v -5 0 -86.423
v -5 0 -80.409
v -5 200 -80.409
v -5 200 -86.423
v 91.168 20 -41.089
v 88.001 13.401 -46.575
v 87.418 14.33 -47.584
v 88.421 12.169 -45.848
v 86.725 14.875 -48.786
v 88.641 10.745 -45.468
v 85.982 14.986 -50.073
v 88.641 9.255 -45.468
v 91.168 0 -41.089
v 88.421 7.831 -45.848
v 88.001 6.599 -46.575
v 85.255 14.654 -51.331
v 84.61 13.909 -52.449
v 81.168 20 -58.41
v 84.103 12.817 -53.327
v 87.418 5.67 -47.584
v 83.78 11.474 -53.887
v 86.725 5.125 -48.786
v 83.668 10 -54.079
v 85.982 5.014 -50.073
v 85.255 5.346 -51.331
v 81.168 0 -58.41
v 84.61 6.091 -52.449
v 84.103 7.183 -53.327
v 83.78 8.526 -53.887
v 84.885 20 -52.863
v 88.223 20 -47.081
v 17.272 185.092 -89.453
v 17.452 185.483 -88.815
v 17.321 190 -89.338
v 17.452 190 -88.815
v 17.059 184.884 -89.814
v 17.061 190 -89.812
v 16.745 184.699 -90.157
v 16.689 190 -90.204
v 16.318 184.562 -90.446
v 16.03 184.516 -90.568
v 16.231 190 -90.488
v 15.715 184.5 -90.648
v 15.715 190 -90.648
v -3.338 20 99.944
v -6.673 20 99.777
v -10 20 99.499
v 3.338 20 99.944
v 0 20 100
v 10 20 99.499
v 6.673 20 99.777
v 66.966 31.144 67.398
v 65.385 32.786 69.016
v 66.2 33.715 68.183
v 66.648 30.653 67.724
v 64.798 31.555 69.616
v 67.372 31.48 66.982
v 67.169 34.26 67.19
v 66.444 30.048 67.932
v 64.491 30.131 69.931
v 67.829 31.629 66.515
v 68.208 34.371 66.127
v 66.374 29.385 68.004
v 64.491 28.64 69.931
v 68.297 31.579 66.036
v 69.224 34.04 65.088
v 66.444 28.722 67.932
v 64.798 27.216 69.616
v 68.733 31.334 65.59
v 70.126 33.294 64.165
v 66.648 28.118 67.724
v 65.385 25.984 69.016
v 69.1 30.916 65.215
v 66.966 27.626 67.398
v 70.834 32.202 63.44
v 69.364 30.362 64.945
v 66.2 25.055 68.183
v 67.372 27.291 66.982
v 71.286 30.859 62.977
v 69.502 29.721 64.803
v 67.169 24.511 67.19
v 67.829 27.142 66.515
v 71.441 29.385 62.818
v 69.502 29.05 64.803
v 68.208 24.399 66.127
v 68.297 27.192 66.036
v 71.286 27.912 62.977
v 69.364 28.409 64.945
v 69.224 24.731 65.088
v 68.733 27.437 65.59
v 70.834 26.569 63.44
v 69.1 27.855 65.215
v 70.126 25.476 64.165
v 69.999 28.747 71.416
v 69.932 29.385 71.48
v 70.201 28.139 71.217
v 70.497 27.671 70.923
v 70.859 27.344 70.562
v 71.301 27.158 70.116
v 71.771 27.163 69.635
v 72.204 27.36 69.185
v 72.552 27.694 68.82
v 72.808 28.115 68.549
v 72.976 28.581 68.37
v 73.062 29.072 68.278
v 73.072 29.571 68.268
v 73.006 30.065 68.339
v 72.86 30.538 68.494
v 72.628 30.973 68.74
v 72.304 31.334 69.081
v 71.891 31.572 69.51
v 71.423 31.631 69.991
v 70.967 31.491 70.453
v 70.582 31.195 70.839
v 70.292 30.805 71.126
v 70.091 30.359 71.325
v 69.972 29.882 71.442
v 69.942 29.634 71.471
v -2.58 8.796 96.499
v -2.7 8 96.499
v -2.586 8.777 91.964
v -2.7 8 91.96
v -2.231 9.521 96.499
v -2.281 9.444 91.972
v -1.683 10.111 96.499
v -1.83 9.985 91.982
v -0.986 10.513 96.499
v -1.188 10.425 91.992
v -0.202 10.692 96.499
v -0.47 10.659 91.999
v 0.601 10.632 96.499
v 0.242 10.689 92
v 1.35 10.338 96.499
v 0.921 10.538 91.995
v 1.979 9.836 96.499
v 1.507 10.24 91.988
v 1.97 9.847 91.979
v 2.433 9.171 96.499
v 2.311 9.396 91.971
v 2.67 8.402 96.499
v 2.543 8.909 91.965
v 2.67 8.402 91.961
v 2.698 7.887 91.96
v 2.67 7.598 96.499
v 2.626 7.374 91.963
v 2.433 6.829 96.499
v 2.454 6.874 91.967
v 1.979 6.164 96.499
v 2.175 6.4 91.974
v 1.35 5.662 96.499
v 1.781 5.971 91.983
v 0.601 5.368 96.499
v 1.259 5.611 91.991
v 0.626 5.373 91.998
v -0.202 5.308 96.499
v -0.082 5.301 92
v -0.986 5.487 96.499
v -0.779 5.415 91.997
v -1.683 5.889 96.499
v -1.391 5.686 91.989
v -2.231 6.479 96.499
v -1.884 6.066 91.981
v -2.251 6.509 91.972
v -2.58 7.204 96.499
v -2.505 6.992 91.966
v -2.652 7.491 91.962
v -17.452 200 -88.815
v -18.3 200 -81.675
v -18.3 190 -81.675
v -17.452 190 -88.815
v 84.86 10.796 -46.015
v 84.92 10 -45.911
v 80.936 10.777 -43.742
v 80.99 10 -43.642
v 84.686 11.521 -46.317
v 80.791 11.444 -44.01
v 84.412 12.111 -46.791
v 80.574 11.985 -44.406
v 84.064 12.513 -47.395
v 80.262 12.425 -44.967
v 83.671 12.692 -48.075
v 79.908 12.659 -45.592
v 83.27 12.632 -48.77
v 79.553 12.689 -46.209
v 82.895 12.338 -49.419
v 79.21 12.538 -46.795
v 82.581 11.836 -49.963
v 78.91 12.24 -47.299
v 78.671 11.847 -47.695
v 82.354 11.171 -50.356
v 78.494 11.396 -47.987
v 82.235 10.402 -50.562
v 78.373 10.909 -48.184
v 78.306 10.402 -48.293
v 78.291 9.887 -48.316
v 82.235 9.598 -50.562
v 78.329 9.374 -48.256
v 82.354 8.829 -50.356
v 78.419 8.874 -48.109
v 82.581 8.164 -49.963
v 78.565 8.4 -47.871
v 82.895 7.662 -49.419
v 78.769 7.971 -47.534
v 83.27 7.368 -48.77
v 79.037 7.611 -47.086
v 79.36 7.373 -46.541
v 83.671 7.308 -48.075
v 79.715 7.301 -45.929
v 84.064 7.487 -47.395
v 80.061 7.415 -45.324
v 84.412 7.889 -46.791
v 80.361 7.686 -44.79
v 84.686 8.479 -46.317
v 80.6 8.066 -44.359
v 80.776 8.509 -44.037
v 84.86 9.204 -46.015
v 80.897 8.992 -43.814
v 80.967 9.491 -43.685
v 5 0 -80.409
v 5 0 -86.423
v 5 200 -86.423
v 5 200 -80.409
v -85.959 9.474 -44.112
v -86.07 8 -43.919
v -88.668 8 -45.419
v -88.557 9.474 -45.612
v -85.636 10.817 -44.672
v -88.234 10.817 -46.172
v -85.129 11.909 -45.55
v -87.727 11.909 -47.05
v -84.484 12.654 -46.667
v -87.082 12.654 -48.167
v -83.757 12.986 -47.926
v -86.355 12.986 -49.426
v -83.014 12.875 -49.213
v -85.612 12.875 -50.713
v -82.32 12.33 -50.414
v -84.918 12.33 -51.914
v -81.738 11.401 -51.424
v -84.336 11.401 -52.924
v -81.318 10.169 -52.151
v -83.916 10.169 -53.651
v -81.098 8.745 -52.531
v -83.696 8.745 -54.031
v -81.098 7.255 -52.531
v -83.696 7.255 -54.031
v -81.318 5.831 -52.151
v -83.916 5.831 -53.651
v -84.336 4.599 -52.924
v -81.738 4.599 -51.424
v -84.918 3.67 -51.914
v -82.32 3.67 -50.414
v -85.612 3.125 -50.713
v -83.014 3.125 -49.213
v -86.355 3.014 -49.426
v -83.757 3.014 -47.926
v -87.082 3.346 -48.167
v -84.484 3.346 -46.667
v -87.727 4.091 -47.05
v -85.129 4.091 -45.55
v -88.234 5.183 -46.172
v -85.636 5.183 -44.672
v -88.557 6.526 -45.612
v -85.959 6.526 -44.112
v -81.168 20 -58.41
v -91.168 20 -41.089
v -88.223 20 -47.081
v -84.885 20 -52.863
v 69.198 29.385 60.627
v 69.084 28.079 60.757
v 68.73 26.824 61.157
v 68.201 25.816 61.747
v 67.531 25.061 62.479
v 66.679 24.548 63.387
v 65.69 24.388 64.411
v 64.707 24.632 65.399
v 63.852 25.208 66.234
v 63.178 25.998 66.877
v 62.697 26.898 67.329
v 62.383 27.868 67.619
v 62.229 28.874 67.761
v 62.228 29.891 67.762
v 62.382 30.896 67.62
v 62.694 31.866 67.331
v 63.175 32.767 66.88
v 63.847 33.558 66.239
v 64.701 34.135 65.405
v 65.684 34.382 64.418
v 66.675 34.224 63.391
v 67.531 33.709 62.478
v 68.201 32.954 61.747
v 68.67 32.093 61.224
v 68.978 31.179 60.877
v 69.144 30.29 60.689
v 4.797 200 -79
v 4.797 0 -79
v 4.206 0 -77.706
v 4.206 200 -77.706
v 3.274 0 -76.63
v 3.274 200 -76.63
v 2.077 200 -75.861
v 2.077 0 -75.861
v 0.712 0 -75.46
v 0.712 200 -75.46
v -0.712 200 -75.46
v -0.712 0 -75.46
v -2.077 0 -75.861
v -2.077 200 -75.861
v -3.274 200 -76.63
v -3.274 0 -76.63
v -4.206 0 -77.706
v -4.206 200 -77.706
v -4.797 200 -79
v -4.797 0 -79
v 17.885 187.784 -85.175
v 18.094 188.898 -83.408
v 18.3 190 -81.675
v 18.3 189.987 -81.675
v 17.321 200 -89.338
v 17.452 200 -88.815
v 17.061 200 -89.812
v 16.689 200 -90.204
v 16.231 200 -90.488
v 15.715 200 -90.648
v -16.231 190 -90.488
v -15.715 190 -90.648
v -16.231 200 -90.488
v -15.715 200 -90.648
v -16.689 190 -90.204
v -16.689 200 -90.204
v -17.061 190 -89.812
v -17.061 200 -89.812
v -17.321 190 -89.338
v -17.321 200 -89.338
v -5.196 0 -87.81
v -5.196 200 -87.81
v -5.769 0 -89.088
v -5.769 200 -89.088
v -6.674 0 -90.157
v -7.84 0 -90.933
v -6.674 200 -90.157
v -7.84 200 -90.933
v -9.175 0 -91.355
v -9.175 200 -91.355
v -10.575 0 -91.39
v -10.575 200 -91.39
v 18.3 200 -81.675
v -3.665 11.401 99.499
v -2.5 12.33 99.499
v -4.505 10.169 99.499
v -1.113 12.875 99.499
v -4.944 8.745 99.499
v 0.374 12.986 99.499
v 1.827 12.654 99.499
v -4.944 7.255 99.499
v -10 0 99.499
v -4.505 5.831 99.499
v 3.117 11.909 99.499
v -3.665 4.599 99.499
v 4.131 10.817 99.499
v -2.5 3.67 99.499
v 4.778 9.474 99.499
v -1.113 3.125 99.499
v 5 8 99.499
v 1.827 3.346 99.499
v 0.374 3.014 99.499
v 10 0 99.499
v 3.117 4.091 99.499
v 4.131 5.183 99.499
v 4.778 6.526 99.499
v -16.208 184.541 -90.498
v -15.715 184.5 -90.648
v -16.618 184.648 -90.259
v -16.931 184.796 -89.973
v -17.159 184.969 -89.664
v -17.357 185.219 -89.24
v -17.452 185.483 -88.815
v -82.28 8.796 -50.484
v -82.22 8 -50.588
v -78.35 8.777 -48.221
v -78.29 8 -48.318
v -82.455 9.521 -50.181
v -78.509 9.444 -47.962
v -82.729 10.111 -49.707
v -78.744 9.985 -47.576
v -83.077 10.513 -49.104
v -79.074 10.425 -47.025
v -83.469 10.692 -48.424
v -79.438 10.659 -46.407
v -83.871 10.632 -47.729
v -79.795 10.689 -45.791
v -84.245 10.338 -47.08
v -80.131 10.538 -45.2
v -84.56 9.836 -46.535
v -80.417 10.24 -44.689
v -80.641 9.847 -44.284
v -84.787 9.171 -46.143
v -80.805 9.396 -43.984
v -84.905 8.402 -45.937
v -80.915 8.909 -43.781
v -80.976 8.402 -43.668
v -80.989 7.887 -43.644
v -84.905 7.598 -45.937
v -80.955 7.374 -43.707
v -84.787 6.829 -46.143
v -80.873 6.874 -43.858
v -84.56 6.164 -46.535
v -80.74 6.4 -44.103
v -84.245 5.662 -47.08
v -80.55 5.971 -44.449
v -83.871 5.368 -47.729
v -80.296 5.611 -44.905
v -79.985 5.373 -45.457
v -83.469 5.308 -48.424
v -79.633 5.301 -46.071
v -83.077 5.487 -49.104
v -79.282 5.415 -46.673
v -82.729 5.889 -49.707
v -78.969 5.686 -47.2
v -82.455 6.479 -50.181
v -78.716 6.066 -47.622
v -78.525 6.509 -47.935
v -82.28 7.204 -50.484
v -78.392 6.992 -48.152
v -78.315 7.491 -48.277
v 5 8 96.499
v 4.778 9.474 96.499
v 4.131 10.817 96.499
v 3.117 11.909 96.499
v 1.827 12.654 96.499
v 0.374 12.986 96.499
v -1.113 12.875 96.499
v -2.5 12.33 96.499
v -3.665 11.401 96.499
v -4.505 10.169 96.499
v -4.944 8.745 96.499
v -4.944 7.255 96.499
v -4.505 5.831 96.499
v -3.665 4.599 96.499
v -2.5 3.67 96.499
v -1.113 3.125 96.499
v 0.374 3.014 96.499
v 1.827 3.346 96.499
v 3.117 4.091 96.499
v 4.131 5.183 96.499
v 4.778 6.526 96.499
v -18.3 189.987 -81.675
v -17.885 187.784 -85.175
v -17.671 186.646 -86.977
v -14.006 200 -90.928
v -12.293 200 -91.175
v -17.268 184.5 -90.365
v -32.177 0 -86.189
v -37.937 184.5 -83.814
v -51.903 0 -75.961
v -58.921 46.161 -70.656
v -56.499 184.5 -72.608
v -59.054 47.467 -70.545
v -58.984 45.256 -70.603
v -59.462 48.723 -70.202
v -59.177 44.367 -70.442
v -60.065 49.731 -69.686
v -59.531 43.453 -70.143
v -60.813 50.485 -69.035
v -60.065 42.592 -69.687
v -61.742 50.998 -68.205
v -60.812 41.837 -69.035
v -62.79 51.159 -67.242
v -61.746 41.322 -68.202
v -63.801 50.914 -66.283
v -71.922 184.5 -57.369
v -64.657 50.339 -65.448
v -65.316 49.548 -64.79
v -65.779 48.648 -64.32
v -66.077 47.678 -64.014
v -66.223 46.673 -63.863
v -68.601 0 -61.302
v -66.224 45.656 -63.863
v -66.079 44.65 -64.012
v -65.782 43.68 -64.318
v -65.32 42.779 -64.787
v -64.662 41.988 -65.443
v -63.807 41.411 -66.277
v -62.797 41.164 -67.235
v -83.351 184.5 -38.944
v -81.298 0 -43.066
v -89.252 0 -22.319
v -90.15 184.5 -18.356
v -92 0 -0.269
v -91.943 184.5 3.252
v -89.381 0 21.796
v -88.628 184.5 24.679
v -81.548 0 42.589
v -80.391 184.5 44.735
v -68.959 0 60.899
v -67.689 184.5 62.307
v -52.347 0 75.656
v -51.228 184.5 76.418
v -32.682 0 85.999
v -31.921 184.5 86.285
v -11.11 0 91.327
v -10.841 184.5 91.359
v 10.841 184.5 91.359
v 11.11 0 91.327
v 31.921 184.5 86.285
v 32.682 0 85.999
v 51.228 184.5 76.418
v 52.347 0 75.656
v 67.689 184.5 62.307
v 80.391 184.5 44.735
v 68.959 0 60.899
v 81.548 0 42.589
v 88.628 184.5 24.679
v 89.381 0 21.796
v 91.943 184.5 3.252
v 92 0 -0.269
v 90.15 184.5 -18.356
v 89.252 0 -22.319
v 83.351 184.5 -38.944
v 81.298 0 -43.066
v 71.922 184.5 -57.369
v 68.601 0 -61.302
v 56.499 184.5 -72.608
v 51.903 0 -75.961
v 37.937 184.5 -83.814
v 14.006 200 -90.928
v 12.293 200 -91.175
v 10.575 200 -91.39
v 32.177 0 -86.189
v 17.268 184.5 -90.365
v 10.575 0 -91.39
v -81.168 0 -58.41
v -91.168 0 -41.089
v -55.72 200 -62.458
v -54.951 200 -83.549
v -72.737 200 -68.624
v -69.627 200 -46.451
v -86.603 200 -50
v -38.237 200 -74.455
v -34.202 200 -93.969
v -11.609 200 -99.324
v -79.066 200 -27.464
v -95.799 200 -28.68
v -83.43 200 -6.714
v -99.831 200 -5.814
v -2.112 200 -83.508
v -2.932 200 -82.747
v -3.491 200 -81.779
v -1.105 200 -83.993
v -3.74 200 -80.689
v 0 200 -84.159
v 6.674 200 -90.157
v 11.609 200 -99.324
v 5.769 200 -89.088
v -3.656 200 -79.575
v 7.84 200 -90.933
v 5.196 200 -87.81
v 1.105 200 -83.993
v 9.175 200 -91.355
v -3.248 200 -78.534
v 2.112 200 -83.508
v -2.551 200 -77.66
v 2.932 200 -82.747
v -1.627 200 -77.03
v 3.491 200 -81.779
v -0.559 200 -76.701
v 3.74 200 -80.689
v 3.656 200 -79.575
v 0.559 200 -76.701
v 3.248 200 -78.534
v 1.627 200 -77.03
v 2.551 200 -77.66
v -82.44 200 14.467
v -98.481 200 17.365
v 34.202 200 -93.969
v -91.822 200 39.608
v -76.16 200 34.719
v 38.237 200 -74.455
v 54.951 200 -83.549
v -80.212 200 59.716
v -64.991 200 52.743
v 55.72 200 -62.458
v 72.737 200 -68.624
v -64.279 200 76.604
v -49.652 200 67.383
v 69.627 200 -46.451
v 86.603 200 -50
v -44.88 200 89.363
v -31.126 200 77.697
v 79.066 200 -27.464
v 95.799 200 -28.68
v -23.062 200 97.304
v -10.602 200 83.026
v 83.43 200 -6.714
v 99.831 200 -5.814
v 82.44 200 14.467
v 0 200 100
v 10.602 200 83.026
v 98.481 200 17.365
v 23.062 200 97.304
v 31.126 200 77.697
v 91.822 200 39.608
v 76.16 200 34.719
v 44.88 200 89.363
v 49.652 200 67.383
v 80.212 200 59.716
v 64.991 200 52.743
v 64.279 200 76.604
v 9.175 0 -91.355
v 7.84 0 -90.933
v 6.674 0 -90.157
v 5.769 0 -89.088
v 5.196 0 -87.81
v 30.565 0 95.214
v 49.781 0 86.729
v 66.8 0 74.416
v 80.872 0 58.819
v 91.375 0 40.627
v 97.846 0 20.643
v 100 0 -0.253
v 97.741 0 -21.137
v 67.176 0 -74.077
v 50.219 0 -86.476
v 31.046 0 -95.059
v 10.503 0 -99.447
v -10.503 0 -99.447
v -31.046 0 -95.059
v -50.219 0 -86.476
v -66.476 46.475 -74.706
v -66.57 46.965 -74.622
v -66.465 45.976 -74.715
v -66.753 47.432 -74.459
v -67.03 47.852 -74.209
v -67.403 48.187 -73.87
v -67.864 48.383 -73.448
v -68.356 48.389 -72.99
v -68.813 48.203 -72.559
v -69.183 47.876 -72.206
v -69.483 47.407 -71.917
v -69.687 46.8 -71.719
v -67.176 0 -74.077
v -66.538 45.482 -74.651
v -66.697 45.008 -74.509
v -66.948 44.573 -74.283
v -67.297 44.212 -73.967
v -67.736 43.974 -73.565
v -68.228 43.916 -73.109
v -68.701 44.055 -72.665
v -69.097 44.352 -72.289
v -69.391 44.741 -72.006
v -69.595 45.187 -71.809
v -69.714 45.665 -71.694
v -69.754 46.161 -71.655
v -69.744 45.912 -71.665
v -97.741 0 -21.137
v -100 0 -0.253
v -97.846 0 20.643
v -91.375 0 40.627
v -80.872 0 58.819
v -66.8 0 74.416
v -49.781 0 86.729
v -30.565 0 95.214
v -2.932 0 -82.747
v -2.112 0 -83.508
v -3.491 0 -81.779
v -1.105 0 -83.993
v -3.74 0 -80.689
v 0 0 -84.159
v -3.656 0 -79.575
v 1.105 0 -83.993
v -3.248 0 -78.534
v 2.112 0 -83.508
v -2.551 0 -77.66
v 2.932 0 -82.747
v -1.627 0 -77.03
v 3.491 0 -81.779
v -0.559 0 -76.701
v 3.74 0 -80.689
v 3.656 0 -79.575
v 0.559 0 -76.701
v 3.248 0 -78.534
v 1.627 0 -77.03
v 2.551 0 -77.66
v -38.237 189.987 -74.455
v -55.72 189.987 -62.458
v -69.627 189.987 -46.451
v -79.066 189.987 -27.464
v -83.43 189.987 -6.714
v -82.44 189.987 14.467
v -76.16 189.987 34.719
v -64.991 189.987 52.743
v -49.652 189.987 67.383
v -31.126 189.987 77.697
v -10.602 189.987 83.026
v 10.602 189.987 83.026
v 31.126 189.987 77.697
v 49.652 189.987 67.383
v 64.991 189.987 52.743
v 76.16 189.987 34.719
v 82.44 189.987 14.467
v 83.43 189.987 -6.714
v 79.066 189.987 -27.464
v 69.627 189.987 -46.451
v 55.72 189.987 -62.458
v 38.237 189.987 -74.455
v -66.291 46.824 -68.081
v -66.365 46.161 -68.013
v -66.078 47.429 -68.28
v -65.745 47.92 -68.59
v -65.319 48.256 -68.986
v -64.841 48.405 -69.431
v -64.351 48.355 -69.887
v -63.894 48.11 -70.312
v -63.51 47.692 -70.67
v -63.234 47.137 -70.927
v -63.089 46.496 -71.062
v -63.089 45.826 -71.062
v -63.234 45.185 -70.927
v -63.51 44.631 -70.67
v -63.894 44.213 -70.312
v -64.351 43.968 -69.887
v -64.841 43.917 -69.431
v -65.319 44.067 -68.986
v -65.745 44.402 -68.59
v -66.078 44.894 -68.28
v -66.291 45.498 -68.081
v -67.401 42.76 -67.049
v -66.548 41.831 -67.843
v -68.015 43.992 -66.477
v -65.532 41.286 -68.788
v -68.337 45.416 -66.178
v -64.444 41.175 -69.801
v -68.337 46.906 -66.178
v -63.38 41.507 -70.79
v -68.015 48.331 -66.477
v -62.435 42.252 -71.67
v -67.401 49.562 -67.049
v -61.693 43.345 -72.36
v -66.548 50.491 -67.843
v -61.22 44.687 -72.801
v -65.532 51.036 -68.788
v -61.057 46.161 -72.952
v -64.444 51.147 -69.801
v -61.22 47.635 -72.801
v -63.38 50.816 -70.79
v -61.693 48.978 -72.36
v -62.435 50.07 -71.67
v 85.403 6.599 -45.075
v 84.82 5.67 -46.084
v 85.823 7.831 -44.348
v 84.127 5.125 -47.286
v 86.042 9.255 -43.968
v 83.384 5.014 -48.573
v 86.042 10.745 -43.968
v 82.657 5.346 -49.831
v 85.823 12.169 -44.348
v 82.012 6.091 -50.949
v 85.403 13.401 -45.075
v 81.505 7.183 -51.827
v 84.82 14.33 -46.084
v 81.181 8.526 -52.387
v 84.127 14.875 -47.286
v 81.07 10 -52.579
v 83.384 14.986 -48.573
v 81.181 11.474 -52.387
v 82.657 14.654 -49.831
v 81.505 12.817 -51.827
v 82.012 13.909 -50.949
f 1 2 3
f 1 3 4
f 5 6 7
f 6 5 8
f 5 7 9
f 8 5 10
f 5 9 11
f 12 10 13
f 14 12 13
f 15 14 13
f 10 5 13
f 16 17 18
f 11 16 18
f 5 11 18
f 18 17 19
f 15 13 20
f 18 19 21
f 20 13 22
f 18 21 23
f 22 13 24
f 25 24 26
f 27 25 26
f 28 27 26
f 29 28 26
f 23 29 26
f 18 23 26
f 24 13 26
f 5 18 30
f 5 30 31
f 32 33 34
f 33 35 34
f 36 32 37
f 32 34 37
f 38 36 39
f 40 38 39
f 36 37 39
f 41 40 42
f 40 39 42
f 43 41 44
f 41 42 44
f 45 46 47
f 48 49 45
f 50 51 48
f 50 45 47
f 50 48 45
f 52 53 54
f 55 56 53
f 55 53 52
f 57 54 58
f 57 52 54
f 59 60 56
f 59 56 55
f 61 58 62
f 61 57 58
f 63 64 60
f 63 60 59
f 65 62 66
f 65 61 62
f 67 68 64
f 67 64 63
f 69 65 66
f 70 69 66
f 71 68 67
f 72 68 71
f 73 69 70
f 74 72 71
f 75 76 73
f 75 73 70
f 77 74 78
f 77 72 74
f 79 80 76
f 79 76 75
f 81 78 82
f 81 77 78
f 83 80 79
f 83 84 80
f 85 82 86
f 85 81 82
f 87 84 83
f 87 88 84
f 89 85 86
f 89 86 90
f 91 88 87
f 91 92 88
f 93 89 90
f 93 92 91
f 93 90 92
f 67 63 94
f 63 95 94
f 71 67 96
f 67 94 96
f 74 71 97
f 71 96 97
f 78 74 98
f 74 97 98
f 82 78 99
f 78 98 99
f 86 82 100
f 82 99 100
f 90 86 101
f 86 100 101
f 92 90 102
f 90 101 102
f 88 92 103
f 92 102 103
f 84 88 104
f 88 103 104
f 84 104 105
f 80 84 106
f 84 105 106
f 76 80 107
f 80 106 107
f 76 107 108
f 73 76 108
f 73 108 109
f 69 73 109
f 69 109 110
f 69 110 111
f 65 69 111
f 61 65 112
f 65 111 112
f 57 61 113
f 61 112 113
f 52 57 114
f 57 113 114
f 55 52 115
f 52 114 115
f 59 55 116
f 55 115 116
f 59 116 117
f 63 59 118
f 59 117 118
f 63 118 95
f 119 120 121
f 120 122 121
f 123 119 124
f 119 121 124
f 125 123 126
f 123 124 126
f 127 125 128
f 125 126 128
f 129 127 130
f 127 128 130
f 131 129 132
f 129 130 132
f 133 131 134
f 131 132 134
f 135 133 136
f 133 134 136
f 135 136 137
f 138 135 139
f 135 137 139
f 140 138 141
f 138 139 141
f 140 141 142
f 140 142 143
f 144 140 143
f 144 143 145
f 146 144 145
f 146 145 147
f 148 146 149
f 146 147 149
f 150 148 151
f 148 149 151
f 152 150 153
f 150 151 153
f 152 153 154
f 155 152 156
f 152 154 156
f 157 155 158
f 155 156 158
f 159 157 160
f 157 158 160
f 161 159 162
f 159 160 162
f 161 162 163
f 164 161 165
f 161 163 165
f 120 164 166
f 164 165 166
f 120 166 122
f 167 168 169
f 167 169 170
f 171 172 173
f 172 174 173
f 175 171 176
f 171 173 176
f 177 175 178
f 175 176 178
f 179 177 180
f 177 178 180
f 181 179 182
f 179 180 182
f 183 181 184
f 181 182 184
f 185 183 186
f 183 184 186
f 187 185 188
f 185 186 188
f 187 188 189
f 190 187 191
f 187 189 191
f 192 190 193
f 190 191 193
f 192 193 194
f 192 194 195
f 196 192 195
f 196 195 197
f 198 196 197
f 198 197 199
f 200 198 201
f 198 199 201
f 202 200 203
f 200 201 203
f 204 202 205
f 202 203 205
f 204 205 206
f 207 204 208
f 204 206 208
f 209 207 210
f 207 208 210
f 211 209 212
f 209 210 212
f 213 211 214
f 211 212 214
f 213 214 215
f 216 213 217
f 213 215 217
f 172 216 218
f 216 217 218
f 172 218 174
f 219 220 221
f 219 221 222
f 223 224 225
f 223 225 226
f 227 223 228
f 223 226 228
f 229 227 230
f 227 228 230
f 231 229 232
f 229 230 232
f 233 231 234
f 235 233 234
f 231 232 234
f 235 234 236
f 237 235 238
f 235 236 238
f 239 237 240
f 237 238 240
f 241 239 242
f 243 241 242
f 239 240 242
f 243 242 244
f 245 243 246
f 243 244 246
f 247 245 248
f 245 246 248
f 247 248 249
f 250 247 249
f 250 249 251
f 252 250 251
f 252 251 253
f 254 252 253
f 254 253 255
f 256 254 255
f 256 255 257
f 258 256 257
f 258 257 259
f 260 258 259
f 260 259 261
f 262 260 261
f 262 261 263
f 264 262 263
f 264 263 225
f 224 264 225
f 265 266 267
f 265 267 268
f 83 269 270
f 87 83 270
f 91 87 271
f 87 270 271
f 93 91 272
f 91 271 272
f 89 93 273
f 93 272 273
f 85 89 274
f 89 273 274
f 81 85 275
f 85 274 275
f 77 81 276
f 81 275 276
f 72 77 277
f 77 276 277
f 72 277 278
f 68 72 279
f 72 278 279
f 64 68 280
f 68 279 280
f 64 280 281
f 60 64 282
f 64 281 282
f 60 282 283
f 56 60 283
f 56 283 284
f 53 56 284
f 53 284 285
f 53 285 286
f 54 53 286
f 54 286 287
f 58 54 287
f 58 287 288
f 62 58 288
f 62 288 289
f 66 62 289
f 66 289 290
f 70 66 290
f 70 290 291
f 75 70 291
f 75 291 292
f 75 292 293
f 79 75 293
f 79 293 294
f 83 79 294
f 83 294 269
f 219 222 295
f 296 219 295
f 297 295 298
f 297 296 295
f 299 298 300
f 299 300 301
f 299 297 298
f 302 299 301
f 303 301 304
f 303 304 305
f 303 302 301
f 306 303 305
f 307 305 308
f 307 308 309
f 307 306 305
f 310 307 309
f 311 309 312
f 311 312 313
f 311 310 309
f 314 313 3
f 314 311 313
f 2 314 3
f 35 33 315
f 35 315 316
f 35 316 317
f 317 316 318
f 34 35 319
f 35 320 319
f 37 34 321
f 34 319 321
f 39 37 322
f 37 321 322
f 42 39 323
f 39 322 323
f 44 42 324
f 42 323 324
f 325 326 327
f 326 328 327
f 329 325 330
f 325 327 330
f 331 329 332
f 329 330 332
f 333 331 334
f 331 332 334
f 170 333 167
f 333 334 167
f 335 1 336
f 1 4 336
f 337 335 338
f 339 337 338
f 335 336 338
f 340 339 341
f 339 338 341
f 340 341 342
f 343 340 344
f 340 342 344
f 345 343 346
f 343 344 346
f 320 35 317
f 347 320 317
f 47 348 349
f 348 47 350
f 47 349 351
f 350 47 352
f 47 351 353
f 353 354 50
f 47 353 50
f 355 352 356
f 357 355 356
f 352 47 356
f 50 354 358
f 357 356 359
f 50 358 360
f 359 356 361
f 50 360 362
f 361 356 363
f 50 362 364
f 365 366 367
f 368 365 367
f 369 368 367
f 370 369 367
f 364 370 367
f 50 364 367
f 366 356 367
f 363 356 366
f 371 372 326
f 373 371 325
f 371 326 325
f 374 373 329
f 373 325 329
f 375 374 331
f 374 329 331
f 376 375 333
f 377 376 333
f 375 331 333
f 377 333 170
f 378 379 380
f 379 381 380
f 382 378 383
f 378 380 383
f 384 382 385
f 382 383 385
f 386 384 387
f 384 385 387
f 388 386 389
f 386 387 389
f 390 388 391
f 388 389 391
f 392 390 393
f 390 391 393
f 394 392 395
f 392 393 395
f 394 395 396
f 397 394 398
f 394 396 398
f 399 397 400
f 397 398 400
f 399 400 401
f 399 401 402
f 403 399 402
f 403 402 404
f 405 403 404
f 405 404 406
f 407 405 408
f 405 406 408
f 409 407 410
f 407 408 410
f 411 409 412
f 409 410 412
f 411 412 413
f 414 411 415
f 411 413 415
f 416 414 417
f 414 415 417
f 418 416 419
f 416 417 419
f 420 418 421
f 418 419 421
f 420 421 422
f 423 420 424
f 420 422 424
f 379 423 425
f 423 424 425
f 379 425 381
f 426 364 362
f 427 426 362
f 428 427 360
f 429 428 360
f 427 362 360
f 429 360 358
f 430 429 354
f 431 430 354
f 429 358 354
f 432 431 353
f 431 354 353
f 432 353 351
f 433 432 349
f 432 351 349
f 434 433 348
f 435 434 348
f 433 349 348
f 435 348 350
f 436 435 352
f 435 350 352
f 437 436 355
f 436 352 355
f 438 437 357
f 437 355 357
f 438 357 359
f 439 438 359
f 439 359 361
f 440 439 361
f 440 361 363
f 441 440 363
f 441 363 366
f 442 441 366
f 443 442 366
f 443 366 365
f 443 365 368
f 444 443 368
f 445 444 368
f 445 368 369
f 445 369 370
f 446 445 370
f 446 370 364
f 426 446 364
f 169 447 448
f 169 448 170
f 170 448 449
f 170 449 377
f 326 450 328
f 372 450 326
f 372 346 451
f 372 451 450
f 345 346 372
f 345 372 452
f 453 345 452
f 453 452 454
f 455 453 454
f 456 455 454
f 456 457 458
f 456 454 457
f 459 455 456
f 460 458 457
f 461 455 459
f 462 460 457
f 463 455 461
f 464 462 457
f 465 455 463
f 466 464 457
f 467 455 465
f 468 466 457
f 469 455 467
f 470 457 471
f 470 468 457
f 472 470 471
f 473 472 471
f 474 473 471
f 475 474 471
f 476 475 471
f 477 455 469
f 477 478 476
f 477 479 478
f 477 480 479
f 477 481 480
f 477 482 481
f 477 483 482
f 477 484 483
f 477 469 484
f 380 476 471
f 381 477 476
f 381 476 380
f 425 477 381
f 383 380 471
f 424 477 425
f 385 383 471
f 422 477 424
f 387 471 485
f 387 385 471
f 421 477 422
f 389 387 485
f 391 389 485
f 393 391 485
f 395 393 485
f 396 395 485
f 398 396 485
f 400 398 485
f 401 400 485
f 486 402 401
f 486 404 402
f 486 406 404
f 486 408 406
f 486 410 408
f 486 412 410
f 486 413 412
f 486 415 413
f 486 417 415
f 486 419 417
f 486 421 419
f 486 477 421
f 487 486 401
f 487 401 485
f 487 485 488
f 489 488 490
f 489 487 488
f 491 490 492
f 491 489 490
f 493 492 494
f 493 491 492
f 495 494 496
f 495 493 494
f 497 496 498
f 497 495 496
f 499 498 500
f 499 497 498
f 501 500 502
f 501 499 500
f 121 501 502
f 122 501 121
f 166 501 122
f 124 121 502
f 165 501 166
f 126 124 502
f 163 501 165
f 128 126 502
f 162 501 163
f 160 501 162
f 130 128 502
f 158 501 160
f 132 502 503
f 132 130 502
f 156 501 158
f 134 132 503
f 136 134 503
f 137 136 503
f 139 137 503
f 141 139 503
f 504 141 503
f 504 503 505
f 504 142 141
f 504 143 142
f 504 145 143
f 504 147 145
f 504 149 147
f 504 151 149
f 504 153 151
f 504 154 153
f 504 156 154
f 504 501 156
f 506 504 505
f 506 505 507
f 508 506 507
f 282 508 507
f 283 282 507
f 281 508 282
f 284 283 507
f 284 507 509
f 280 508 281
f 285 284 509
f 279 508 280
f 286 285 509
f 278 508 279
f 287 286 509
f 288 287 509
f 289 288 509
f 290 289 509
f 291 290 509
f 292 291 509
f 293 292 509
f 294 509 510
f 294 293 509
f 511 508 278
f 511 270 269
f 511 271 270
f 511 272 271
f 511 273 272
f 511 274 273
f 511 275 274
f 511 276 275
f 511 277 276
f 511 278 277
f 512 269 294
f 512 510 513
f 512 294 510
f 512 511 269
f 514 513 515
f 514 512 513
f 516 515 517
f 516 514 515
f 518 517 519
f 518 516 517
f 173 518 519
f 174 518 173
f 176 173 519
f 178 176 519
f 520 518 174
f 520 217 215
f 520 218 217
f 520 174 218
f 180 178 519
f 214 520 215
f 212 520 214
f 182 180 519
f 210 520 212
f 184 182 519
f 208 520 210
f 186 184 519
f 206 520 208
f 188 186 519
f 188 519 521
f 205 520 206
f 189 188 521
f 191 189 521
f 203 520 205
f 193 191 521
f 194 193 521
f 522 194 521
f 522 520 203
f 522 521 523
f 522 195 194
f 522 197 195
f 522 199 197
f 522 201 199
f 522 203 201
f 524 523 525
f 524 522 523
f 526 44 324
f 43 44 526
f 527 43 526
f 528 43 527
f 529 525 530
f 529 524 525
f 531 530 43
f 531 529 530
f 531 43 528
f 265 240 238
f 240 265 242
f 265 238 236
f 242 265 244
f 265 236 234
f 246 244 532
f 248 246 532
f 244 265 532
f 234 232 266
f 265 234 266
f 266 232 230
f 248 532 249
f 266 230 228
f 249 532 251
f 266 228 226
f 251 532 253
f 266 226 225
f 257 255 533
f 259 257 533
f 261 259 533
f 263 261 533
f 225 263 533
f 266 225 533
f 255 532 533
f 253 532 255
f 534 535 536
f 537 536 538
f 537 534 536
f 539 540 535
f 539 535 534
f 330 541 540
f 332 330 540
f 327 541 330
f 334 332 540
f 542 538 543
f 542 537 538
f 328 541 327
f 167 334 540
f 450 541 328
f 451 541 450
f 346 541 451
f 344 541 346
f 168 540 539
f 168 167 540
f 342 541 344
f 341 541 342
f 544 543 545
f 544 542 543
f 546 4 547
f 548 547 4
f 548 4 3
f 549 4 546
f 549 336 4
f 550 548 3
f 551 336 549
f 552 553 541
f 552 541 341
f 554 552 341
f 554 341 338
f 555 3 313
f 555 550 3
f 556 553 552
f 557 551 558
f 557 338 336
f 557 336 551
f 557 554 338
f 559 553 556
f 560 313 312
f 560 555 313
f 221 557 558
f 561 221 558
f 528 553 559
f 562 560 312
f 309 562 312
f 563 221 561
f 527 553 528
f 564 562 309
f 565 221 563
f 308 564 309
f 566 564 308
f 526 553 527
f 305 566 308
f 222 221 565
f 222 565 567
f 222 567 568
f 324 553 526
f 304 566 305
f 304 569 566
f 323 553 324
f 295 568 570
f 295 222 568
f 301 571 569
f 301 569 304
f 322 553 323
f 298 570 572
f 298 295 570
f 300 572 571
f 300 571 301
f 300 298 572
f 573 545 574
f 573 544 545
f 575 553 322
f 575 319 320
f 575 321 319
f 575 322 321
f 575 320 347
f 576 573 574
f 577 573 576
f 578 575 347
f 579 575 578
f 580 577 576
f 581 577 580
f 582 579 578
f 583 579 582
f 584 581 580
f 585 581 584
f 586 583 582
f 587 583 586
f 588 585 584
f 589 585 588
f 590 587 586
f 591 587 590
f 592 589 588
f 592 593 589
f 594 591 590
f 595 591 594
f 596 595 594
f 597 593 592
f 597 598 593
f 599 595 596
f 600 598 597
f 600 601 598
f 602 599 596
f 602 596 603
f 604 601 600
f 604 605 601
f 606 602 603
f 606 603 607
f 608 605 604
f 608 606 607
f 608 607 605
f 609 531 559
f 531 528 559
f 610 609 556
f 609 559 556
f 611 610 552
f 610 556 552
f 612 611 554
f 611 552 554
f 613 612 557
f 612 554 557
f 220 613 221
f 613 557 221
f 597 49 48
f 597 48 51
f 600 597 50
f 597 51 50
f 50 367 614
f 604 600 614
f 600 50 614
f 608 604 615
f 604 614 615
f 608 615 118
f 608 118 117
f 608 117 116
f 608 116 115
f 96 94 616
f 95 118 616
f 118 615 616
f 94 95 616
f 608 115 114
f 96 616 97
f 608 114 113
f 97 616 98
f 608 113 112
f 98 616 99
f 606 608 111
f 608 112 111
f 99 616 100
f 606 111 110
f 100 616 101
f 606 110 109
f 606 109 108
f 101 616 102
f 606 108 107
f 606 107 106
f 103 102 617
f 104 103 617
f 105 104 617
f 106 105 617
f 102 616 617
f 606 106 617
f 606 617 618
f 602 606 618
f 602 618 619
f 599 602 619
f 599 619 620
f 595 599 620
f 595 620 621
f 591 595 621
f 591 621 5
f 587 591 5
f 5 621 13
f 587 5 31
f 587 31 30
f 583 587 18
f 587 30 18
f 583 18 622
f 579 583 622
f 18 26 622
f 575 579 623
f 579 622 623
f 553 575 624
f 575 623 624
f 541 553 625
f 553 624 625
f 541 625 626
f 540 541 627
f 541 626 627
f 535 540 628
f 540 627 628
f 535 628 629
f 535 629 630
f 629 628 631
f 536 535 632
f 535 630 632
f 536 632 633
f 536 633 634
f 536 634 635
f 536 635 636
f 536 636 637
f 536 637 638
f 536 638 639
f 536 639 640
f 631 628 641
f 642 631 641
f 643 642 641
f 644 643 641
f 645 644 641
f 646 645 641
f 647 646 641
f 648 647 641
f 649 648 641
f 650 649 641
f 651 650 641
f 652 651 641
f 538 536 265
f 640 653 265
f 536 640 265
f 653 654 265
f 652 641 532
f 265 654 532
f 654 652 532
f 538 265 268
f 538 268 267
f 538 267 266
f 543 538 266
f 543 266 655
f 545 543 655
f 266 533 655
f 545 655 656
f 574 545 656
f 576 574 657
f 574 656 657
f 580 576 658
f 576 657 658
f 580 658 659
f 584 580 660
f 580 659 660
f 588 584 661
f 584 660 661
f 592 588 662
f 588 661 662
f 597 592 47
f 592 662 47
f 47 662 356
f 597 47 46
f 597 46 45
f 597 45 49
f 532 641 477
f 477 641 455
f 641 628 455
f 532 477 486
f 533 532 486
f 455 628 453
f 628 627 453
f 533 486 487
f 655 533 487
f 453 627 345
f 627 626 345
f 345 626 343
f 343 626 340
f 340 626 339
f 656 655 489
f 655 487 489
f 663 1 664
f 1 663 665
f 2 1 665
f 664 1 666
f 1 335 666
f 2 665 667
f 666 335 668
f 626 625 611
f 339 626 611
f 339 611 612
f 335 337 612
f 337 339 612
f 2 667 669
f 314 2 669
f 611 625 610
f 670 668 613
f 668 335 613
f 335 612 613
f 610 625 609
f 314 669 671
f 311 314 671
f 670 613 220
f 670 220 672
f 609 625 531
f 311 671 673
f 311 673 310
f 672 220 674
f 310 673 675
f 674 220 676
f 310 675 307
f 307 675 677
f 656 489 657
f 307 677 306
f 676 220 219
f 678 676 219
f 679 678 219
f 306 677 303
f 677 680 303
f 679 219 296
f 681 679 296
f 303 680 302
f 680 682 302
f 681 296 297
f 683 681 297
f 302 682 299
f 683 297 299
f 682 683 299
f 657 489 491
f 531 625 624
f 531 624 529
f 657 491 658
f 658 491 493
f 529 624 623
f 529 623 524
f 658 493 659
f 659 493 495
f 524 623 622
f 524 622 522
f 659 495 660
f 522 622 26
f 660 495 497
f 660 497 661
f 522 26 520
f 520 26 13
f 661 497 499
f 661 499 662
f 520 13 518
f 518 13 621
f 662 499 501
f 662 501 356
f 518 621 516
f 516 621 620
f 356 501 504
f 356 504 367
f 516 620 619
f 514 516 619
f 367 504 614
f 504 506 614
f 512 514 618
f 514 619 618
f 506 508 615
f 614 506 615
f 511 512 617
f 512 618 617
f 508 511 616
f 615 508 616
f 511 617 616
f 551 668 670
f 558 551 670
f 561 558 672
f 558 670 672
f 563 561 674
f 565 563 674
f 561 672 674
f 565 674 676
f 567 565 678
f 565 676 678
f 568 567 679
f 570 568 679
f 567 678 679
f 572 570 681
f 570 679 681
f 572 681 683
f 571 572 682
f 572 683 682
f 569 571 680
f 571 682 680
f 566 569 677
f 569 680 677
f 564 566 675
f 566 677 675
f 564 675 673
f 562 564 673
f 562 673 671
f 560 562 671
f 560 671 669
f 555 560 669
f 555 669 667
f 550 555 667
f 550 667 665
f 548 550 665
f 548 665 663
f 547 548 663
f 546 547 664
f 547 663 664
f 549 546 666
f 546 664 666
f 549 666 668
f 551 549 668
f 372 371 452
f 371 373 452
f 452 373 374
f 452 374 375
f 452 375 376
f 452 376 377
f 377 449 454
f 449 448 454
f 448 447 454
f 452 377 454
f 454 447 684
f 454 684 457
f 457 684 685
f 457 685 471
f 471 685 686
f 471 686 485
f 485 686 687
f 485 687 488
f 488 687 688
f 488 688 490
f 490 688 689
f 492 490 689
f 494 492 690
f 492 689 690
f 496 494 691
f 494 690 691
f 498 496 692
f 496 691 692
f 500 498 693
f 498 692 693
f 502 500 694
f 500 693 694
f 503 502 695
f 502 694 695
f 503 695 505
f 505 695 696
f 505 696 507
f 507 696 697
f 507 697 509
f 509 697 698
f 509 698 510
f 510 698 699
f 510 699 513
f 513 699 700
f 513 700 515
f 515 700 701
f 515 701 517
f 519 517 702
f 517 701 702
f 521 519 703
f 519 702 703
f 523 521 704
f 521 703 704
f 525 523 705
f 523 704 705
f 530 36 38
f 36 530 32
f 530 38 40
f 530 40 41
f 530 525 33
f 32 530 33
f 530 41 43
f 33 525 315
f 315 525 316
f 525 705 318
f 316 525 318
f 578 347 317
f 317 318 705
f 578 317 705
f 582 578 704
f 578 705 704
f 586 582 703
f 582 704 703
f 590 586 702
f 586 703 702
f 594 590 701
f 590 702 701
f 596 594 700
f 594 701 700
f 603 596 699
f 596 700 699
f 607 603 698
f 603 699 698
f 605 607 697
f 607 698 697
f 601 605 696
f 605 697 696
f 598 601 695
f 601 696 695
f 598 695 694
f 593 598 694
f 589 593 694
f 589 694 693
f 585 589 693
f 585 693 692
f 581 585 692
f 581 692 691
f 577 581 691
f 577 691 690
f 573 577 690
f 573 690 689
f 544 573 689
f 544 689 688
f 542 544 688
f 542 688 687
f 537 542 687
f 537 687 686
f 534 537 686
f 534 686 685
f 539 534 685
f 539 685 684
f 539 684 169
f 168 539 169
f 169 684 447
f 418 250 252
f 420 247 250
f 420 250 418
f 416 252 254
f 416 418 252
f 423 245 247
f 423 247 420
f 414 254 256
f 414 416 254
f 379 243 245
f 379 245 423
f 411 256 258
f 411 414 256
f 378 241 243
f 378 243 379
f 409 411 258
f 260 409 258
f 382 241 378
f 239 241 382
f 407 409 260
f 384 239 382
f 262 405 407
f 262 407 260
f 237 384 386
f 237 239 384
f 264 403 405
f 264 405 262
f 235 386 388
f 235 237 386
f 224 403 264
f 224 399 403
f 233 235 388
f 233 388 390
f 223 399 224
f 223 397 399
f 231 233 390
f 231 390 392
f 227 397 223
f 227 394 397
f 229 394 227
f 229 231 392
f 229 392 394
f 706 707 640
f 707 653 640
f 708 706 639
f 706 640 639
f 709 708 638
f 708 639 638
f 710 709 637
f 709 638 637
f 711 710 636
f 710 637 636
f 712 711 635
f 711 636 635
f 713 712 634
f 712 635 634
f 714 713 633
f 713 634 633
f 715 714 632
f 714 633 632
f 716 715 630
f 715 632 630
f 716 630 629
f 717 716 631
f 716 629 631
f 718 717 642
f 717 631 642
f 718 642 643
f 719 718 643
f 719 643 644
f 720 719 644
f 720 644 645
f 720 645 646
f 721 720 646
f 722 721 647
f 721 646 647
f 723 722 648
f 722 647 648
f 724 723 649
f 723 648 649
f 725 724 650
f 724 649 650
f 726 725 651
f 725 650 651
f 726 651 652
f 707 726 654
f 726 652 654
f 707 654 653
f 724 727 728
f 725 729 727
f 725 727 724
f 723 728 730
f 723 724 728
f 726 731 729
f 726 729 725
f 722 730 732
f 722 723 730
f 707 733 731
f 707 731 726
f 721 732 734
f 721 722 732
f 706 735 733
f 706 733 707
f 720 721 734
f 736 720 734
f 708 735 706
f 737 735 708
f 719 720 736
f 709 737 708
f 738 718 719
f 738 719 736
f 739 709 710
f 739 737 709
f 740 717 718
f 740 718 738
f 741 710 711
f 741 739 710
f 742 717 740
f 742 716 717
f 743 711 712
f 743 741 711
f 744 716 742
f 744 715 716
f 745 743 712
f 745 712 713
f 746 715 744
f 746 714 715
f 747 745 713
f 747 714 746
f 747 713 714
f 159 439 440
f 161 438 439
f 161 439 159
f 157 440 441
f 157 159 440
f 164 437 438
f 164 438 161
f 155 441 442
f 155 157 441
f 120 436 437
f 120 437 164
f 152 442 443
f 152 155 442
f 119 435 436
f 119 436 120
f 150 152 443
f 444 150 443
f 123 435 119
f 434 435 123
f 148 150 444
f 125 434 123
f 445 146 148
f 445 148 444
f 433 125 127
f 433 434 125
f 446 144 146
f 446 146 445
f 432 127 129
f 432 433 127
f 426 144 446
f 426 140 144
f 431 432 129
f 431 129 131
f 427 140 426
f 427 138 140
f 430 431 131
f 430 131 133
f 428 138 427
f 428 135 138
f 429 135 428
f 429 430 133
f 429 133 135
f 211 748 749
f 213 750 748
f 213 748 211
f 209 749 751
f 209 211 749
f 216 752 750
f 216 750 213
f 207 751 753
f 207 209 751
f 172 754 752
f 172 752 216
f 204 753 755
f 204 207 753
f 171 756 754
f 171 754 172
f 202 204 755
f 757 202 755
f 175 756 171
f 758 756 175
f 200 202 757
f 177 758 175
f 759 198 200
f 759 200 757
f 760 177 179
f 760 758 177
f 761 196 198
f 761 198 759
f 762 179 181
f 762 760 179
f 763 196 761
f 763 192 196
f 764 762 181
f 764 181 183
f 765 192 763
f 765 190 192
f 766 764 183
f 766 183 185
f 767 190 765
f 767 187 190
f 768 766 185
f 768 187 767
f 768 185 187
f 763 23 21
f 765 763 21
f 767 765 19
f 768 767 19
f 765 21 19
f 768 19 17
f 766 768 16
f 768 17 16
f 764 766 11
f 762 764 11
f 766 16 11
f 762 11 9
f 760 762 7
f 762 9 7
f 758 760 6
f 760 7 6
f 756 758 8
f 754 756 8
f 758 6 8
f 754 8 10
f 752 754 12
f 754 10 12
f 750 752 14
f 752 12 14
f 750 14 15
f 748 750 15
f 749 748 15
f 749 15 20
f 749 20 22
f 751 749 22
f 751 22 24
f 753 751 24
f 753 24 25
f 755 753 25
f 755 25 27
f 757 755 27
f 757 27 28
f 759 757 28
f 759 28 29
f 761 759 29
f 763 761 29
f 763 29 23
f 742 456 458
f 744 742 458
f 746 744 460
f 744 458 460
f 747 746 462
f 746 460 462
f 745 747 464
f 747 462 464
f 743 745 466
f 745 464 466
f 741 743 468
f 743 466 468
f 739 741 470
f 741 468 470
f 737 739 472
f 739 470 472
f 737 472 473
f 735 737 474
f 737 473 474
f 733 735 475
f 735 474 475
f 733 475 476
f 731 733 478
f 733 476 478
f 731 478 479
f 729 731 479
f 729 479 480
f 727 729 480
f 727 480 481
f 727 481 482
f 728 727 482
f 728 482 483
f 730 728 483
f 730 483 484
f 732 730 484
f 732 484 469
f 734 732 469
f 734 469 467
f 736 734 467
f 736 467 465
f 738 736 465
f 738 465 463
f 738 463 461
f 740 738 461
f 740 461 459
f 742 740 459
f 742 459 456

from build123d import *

# Parameters (mm, degrees)
SCHIZZO1_R                                           = 100
ESTRUSIONE_ESTRUSIONE1_DEPTH                         = 200
RACCORDO1_R                                          = 5
ESTRUSIONE_ESTRUSIONE2_START                         = -10
ESTRUSIONE_ESTRUSIONE2_DEPTH                         = 10
SMUSSO1_START                                        = 184.4999999
SMUSSO1_DEPTH                                        = 5.5000001
SMUSSO1_2_ANGLE                                      = 338.362808
RACCORDO2_R                                          = 2.113506
SCHIZZO6_R                                           = 3.75
TAGLIO_ESTRUSIONE1_DEPTH                             = 200
TAGLIO_ESTRUSIONE2_DEPTH                             = 20
FORO_LAMATO_PER_BULLONE_M5_A_TESTA_ESAGO_D           = 5.4
FORO_LAMATO_PER_BULLONE_M5_A_TESTA_ESAGO_DEPTH       = 30
FORO_LAMATO_PER_BULLONE_M5_A_TESTA_ESAGO_CBORE_D     = 10
FORO_LAMATO_PER_BULLONE_M5_A_TESTA_ESAGO_CBORE_DEPTH = 3
FORO_LAMATO_PER_BULLONE_M5_A_TESTA_ESAGO_TIP         = 1.622323671
FORO_LAMATO_PER_BULLONE_M5_A_TESTA_E_2_D             = 5.4
FORO_LAMATO_PER_BULLONE_M5_A_TESTA_E_2_DEPTH         = 30
FORO_LAMATO_PER_BULLONE_M5_A_TESTA_E_2_CBORE_D       = 10
FORO_LAMATO_PER_BULLONE_M5_A_TESTA_E_2_CBORE_DEPTH   = 3
FORO_LAMATO_PER_BULLONE_M5_A_TESTA_E_2_TIP           = 1.622323671
FORO_LAMATO_PER_BULLONE_M5_A_TESTA_E_3_D             = 5.4
FORO_LAMATO_PER_BULLONE_M5_A_TESTA_E_3_DEPTH         = 30
FORO_LAMATO_PER_BULLONE_M5_A_TESTA_E_3_CBORE_D       = 10
FORO_LAMATO_PER_BULLONE_M5_A_TESTA_E_3_CBORE_DEPTH   = 3
FORO_LAMATO_PER_BULLONE_M5_A_TESTA_E_3_TIP           = 1.622323671
FORO_LAMATO_PER_VITE_M4_A_TESTA_ESAGONAL_D           = 4.5
FORO_LAMATO_PER_VITE_M4_A_TESTA_ESAGONAL_DEPTH       = 30
FORO_LAMATO_PER_VITE_M4_A_TESTA_ESAGONAL_CBORE_D     = 10
FORO_LAMATO_PER_VITE_M4_A_TESTA_ESAGONAL_CBORE_DEPTH = 3
FORO_LAMATO_PER_VITE_M4_A_TESTA_ESAGONAL_TIP         = 1.351936393
FORO_LAMATO_PER_VITE_M4_A_TESTA_ESAG_2_D             = 4.5
FORO_LAMATO_PER_VITE_M4_A_TESTA_ESAG_2_DEPTH         = 30
FORO_LAMATO_PER_VITE_M4_A_TESTA_ESAG_2_CBORE_D       = 10
FORO_LAMATO_PER_VITE_M4_A_TESTA_ESAG_2_CBORE_DEPTH   = 3
FORO_LAMATO_PER_VITE_M4_A_TESTA_ESAG_2_TIP           = 1.351936393


with BuildPart() as part:
    # Schizzo1 → Estrusione-Estrusione1 (new body)
    with BuildSketch(Plane(origin=(0, 0, 0), x_dir=(1, 0, 0), z_dir=(0, 1, 0))):
        with Locations(Location((0, 0, 0), (0, 0, 270))):
            Circle(SCHIZZO1_R)
        with BuildLine():
            Line((-5, 80.409122957), (-5, 91.864029957))
            ThreePointArc((-5, 91.864029957), (0, -92), (5, 91.864029957))
            Line((5, 91.864029957), (5, 80.409122957))
            ThreePointArc((5, 80.409122957), (0, 75.409122957), (-5, 80.409122957))
        make_face(mode=Mode.SUBTRACT)
    extrude(amount=ESTRUSIONE_ESTRUSIONE1_DEPTH)

    # Raccordo1
    raccordo1_edges = [part.edges().sort_by_distance(p)[0] for p in [
        (-5, 100, -91.864029957),
        (5, 100, -91.864029957),
    ]]
    fillet(raccordo1_edges, radius=RACCORDO1_R)

    # Schizzo2 → Estrusione-Estrusione2 (add)
    with BuildSketch(Plane(origin=(0, 200, 0), x_dir=(1, 0, 0), z_dir=(0, 1, 0)).offset(ESTRUSIONE_ESTRUSIONE2_START)):
        with BuildLine():
            ThreePointArc((18.3, 81.674965565), (0, -83.7), (-18.3, 81.674965565))
            Line((-18.3, 81.674965565), (-17.268411156, 90.364827096))
            ThreePointArc((-17.268411156, 90.364827096), (-58.631502512, -70.89673415), (92, 0))
            ThreePointArc((92, 0), (70.89673415, 58.631502512), (17.268411156, 90.364827096))
            Line((17.268411156, 90.364827096), (18.3, 81.674965565))
        make_face()
    extrude(amount=ESTRUSIONE_ESTRUSIONE2_DEPTH)

    # Smusso1: read off the stored shape, not the designer's step
    # Smusso1 outline → Smusso1 (add)
    with BuildSketch(Plane(origin=(0, 0, 0), x_dir=(1, 0, 0), z_dir=(0, 1, 0)).offset(SMUSSO1_START)):
        with BuildLine():
            Line((17.268411156, 90.364827097), (18.3, 81.674965565))
            ThreePointArc((18.3, 81.674965565), (0, -83.7), (-18.3, 81.674965565))
            Line((-18.3, 81.674965565), (-17.268411156, 90.364827097))
            ThreePointArc((-17.268411156, 90.364827097), (0, -92), (17.268411156, 90.364827097))
        make_face()
    extrude(amount=SMUSSO1_DEPTH)

    # Smusso1 2 outline → Smusso1 2 (revolve, cut)
    with BuildSketch(Plane(origin=(0, 0, 0), x_dir=(-0.18770012126264535, 0, -0.9822263814813712), z_dir=(0.9822263814813712, 0, -0.18770012126264535))):
        Polygon((92, 184.5), (83.7, 189.98740256), (83.7, 184.4999999), align=None)
    revolve(axis=Axis((0, 0, 0), (0, 1, 0)), revolution_arc=SMUSSO1_2_ANGLE, mode=Mode.SUBTRACT)

    # Raccordo2
    raccordo2_edges = [part.edges().sort_by_distance(p)[0] for p in [
        (17.268411156, 195, -90.364827096),
        (-17.268411156, 195, -90.364827096),
    ]]
    fillet(raccordo2_edges, radius=RACCORDO2_R)

    # Schizzo6 → Taglio-Estrusione1 (cut)
    with BuildSketch(Plane.XZ):
        with Locations(Location((0, -80.409122957, 0), (0, 0, 270))):
            Circle(SCHIZZO6_R)
    extrude(amount=-TAGLIO_ESTRUSIONE1_DEPTH, mode=Mode.SUBTRACT)

    # Schizzo7 → Taglio-Estrusione2 (cut)
    with BuildSketch(Plane.XZ):
        with BuildLine():
            ThreePointArc((10, 99.498743711), (0, 100), (-10, 99.498743711))
            Line((-10, 99.498743711), (10, 99.498743711))
        make_face()
        with BuildLine():
            ThreePointArc((81.168439698, -58.409625893), (86.602540378, -50), (91.168439698, -41.089117817))
            Line((91.168439698, -41.089117817), (81.168439698, -58.409625893))
        make_face()
        with BuildLine():
            Line((-81.168439698, -58.409625893), (-91.168439698, -41.089117817))
            ThreePointArc((-91.168439698, -41.089117817), (-86.602540378, -50), (-81.168439698, -58.409625893))
        make_face()
    extrude(amount=-TAGLIO_ESTRUSIONE2_DEPTH, mode=Mode.SUBTRACT)

    # Foro lamato per Bullone M5 a testa esago
    with Locations(Plane(origin=(86.168439698, 0, -49.749371855), x_dir=(-0.4999999999999976, 0, -0.86602540378444), z_dir=(0.8660254037844402, 0, -0.4999999999999977))):
        with Locations((0, 10)):
            CounterBoreHole(FORO_LAMATO_PER_BULLONE_M5_A_TESTA_ESAGO_D / 2, FORO_LAMATO_PER_BULLONE_M5_A_TESTA_ESAGO_CBORE_D / 2, FORO_LAMATO_PER_BULLONE_M5_A_TESTA_ESAGO_CBORE_DEPTH, depth=FORO_LAMATO_PER_BULLONE_M5_A_TESTA_ESAGO_DEPTH)
            with Locations((0, 0, -(FORO_LAMATO_PER_BULLONE_M5_A_TESTA_ESAGO_DEPTH + FORO_LAMATO_PER_BULLONE_M5_A_TESTA_ESAGO_TIP / 2))):  # 118° drill point
                Cone(0, FORO_LAMATO_PER_BULLONE_M5_A_TESTA_ESAGO_D / 2, FORO_LAMATO_PER_BULLONE_M5_A_TESTA_ESAGO_TIP, mode=Mode.SUBTRACT)

    # Foro lamato per Bullone M5 a testa e 2
    with Locations(Plane(origin=(-86.168439698, 0, -49.749371855), x_dir=(-0.5000000000000044, 0, 0.8660254037844362), z_dir=(-0.8660254037844362, 0, -0.5000000000000044))):
        with Locations((0, 8)):
            CounterBoreHole(FORO_LAMATO_PER_BULLONE_M5_A_TESTA_E_2_D / 2, FORO_LAMATO_PER_BULLONE_M5_A_TESTA_E_2_CBORE_D / 2, FORO_LAMATO_PER_BULLONE_M5_A_TESTA_E_2_CBORE_DEPTH, depth=FORO_LAMATO_PER_BULLONE_M5_A_TESTA_E_2_DEPTH)
            with Locations((0, 0, -(FORO_LAMATO_PER_BULLONE_M5_A_TESTA_E_2_DEPTH + FORO_LAMATO_PER_BULLONE_M5_A_TESTA_E_2_TIP / 2))):  # 118° drill point
                Cone(0, FORO_LAMATO_PER_BULLONE_M5_A_TESTA_E_2_D / 2, FORO_LAMATO_PER_BULLONE_M5_A_TESTA_E_2_TIP, mode=Mode.SUBTRACT)

    # Foro lamato per Bullone M5 a testa e 3
    with Locations(Plane.XY.offset(99.498743711)):
        with Locations((0, 8)):
            CounterBoreHole(FORO_LAMATO_PER_BULLONE_M5_A_TESTA_E_3_D / 2, FORO_LAMATO_PER_BULLONE_M5_A_TESTA_E_3_CBORE_D / 2, FORO_LAMATO_PER_BULLONE_M5_A_TESTA_E_3_CBORE_DEPTH, depth=FORO_LAMATO_PER_BULLONE_M5_A_TESTA_E_3_DEPTH)
            with Locations((0, 0, -(FORO_LAMATO_PER_BULLONE_M5_A_TESTA_E_3_DEPTH + FORO_LAMATO_PER_BULLONE_M5_A_TESTA_E_3_TIP / 2))):  # 118° drill point
                Cone(0, FORO_LAMATO_PER_BULLONE_M5_A_TESTA_E_3_D / 2, FORO_LAMATO_PER_BULLONE_M5_A_TESTA_E_3_TIP, mode=Mode.SUBTRACT)

    # Foro lamato per Vite M4 a testa esagonale-1
    with Locations(Plane(origin=(65.801169357, 29.385293, 64.297792429), x_dir=(0.698889048141, 0, -0.715230101707), z_dir=(-0.715230101707, 0, -0.698889048141))):
        with Locations((0, 0)):
            CounterBoreHole(FORO_LAMATO_PER_VITE_M4_A_TESTA_ESAGONAL_D / 2, FORO_LAMATO_PER_VITE_M4_A_TESTA_ESAGONAL_CBORE_D / 2, FORO_LAMATO_PER_VITE_M4_A_TESTA_ESAGONAL_CBORE_DEPTH, depth=FORO_LAMATO_PER_VITE_M4_A_TESTA_ESAGONAL_DEPTH)
            with Locations((0, 0, -(FORO_LAMATO_PER_VITE_M4_A_TESTA_ESAGONAL_DEPTH + FORO_LAMATO_PER_VITE_M4_A_TESTA_ESAGONAL_TIP / 2))):  # 118° drill point
                Cone(0, FORO_LAMATO_PER_VITE_M4_A_TESTA_ESAGONAL_D / 2, FORO_LAMATO_PER_VITE_M4_A_TESTA_ESAGONAL_TIP, mode=Mode.SUBTRACT)

    # Foro lamato per Vite M4 a testa esag 2
    with Locations(Plane(origin=(-62.673817972, 46.161135949, -67.349777585), x_dir=(0.732062968471, 0, -0.68123697066), z_dir=(0.68123697066, 0, 0.732062968471))):
        with Locations((0, 0)):
            CounterBoreHole(FORO_LAMATO_PER_VITE_M4_A_TESTA_ESAG_2_D / 2, FORO_LAMATO_PER_VITE_M4_A_TESTA_ESAG_2_CBORE_D / 2, FORO_LAMATO_PER_VITE_M4_A_TESTA_ESAG_2_CBORE_DEPTH, depth=FORO_LAMATO_PER_VITE_M4_A_TESTA_ESAG_2_DEPTH)
            with Locations((0, 0, -(FORO_LAMATO_PER_VITE_M4_A_TESTA_ESAG_2_DEPTH + FORO_LAMATO_PER_VITE_M4_A_TESTA_ESAG_2_TIP / 2))):  # 118° drill point
                Cone(0, FORO_LAMATO_PER_VITE_M4_A_TESTA_ESAG_2_D / 2, FORO_LAMATO_PER_VITE_M4_A_TESTA_ESAG_2_TIP, mode=Mode.SUBTRACT)


solid = part.part
